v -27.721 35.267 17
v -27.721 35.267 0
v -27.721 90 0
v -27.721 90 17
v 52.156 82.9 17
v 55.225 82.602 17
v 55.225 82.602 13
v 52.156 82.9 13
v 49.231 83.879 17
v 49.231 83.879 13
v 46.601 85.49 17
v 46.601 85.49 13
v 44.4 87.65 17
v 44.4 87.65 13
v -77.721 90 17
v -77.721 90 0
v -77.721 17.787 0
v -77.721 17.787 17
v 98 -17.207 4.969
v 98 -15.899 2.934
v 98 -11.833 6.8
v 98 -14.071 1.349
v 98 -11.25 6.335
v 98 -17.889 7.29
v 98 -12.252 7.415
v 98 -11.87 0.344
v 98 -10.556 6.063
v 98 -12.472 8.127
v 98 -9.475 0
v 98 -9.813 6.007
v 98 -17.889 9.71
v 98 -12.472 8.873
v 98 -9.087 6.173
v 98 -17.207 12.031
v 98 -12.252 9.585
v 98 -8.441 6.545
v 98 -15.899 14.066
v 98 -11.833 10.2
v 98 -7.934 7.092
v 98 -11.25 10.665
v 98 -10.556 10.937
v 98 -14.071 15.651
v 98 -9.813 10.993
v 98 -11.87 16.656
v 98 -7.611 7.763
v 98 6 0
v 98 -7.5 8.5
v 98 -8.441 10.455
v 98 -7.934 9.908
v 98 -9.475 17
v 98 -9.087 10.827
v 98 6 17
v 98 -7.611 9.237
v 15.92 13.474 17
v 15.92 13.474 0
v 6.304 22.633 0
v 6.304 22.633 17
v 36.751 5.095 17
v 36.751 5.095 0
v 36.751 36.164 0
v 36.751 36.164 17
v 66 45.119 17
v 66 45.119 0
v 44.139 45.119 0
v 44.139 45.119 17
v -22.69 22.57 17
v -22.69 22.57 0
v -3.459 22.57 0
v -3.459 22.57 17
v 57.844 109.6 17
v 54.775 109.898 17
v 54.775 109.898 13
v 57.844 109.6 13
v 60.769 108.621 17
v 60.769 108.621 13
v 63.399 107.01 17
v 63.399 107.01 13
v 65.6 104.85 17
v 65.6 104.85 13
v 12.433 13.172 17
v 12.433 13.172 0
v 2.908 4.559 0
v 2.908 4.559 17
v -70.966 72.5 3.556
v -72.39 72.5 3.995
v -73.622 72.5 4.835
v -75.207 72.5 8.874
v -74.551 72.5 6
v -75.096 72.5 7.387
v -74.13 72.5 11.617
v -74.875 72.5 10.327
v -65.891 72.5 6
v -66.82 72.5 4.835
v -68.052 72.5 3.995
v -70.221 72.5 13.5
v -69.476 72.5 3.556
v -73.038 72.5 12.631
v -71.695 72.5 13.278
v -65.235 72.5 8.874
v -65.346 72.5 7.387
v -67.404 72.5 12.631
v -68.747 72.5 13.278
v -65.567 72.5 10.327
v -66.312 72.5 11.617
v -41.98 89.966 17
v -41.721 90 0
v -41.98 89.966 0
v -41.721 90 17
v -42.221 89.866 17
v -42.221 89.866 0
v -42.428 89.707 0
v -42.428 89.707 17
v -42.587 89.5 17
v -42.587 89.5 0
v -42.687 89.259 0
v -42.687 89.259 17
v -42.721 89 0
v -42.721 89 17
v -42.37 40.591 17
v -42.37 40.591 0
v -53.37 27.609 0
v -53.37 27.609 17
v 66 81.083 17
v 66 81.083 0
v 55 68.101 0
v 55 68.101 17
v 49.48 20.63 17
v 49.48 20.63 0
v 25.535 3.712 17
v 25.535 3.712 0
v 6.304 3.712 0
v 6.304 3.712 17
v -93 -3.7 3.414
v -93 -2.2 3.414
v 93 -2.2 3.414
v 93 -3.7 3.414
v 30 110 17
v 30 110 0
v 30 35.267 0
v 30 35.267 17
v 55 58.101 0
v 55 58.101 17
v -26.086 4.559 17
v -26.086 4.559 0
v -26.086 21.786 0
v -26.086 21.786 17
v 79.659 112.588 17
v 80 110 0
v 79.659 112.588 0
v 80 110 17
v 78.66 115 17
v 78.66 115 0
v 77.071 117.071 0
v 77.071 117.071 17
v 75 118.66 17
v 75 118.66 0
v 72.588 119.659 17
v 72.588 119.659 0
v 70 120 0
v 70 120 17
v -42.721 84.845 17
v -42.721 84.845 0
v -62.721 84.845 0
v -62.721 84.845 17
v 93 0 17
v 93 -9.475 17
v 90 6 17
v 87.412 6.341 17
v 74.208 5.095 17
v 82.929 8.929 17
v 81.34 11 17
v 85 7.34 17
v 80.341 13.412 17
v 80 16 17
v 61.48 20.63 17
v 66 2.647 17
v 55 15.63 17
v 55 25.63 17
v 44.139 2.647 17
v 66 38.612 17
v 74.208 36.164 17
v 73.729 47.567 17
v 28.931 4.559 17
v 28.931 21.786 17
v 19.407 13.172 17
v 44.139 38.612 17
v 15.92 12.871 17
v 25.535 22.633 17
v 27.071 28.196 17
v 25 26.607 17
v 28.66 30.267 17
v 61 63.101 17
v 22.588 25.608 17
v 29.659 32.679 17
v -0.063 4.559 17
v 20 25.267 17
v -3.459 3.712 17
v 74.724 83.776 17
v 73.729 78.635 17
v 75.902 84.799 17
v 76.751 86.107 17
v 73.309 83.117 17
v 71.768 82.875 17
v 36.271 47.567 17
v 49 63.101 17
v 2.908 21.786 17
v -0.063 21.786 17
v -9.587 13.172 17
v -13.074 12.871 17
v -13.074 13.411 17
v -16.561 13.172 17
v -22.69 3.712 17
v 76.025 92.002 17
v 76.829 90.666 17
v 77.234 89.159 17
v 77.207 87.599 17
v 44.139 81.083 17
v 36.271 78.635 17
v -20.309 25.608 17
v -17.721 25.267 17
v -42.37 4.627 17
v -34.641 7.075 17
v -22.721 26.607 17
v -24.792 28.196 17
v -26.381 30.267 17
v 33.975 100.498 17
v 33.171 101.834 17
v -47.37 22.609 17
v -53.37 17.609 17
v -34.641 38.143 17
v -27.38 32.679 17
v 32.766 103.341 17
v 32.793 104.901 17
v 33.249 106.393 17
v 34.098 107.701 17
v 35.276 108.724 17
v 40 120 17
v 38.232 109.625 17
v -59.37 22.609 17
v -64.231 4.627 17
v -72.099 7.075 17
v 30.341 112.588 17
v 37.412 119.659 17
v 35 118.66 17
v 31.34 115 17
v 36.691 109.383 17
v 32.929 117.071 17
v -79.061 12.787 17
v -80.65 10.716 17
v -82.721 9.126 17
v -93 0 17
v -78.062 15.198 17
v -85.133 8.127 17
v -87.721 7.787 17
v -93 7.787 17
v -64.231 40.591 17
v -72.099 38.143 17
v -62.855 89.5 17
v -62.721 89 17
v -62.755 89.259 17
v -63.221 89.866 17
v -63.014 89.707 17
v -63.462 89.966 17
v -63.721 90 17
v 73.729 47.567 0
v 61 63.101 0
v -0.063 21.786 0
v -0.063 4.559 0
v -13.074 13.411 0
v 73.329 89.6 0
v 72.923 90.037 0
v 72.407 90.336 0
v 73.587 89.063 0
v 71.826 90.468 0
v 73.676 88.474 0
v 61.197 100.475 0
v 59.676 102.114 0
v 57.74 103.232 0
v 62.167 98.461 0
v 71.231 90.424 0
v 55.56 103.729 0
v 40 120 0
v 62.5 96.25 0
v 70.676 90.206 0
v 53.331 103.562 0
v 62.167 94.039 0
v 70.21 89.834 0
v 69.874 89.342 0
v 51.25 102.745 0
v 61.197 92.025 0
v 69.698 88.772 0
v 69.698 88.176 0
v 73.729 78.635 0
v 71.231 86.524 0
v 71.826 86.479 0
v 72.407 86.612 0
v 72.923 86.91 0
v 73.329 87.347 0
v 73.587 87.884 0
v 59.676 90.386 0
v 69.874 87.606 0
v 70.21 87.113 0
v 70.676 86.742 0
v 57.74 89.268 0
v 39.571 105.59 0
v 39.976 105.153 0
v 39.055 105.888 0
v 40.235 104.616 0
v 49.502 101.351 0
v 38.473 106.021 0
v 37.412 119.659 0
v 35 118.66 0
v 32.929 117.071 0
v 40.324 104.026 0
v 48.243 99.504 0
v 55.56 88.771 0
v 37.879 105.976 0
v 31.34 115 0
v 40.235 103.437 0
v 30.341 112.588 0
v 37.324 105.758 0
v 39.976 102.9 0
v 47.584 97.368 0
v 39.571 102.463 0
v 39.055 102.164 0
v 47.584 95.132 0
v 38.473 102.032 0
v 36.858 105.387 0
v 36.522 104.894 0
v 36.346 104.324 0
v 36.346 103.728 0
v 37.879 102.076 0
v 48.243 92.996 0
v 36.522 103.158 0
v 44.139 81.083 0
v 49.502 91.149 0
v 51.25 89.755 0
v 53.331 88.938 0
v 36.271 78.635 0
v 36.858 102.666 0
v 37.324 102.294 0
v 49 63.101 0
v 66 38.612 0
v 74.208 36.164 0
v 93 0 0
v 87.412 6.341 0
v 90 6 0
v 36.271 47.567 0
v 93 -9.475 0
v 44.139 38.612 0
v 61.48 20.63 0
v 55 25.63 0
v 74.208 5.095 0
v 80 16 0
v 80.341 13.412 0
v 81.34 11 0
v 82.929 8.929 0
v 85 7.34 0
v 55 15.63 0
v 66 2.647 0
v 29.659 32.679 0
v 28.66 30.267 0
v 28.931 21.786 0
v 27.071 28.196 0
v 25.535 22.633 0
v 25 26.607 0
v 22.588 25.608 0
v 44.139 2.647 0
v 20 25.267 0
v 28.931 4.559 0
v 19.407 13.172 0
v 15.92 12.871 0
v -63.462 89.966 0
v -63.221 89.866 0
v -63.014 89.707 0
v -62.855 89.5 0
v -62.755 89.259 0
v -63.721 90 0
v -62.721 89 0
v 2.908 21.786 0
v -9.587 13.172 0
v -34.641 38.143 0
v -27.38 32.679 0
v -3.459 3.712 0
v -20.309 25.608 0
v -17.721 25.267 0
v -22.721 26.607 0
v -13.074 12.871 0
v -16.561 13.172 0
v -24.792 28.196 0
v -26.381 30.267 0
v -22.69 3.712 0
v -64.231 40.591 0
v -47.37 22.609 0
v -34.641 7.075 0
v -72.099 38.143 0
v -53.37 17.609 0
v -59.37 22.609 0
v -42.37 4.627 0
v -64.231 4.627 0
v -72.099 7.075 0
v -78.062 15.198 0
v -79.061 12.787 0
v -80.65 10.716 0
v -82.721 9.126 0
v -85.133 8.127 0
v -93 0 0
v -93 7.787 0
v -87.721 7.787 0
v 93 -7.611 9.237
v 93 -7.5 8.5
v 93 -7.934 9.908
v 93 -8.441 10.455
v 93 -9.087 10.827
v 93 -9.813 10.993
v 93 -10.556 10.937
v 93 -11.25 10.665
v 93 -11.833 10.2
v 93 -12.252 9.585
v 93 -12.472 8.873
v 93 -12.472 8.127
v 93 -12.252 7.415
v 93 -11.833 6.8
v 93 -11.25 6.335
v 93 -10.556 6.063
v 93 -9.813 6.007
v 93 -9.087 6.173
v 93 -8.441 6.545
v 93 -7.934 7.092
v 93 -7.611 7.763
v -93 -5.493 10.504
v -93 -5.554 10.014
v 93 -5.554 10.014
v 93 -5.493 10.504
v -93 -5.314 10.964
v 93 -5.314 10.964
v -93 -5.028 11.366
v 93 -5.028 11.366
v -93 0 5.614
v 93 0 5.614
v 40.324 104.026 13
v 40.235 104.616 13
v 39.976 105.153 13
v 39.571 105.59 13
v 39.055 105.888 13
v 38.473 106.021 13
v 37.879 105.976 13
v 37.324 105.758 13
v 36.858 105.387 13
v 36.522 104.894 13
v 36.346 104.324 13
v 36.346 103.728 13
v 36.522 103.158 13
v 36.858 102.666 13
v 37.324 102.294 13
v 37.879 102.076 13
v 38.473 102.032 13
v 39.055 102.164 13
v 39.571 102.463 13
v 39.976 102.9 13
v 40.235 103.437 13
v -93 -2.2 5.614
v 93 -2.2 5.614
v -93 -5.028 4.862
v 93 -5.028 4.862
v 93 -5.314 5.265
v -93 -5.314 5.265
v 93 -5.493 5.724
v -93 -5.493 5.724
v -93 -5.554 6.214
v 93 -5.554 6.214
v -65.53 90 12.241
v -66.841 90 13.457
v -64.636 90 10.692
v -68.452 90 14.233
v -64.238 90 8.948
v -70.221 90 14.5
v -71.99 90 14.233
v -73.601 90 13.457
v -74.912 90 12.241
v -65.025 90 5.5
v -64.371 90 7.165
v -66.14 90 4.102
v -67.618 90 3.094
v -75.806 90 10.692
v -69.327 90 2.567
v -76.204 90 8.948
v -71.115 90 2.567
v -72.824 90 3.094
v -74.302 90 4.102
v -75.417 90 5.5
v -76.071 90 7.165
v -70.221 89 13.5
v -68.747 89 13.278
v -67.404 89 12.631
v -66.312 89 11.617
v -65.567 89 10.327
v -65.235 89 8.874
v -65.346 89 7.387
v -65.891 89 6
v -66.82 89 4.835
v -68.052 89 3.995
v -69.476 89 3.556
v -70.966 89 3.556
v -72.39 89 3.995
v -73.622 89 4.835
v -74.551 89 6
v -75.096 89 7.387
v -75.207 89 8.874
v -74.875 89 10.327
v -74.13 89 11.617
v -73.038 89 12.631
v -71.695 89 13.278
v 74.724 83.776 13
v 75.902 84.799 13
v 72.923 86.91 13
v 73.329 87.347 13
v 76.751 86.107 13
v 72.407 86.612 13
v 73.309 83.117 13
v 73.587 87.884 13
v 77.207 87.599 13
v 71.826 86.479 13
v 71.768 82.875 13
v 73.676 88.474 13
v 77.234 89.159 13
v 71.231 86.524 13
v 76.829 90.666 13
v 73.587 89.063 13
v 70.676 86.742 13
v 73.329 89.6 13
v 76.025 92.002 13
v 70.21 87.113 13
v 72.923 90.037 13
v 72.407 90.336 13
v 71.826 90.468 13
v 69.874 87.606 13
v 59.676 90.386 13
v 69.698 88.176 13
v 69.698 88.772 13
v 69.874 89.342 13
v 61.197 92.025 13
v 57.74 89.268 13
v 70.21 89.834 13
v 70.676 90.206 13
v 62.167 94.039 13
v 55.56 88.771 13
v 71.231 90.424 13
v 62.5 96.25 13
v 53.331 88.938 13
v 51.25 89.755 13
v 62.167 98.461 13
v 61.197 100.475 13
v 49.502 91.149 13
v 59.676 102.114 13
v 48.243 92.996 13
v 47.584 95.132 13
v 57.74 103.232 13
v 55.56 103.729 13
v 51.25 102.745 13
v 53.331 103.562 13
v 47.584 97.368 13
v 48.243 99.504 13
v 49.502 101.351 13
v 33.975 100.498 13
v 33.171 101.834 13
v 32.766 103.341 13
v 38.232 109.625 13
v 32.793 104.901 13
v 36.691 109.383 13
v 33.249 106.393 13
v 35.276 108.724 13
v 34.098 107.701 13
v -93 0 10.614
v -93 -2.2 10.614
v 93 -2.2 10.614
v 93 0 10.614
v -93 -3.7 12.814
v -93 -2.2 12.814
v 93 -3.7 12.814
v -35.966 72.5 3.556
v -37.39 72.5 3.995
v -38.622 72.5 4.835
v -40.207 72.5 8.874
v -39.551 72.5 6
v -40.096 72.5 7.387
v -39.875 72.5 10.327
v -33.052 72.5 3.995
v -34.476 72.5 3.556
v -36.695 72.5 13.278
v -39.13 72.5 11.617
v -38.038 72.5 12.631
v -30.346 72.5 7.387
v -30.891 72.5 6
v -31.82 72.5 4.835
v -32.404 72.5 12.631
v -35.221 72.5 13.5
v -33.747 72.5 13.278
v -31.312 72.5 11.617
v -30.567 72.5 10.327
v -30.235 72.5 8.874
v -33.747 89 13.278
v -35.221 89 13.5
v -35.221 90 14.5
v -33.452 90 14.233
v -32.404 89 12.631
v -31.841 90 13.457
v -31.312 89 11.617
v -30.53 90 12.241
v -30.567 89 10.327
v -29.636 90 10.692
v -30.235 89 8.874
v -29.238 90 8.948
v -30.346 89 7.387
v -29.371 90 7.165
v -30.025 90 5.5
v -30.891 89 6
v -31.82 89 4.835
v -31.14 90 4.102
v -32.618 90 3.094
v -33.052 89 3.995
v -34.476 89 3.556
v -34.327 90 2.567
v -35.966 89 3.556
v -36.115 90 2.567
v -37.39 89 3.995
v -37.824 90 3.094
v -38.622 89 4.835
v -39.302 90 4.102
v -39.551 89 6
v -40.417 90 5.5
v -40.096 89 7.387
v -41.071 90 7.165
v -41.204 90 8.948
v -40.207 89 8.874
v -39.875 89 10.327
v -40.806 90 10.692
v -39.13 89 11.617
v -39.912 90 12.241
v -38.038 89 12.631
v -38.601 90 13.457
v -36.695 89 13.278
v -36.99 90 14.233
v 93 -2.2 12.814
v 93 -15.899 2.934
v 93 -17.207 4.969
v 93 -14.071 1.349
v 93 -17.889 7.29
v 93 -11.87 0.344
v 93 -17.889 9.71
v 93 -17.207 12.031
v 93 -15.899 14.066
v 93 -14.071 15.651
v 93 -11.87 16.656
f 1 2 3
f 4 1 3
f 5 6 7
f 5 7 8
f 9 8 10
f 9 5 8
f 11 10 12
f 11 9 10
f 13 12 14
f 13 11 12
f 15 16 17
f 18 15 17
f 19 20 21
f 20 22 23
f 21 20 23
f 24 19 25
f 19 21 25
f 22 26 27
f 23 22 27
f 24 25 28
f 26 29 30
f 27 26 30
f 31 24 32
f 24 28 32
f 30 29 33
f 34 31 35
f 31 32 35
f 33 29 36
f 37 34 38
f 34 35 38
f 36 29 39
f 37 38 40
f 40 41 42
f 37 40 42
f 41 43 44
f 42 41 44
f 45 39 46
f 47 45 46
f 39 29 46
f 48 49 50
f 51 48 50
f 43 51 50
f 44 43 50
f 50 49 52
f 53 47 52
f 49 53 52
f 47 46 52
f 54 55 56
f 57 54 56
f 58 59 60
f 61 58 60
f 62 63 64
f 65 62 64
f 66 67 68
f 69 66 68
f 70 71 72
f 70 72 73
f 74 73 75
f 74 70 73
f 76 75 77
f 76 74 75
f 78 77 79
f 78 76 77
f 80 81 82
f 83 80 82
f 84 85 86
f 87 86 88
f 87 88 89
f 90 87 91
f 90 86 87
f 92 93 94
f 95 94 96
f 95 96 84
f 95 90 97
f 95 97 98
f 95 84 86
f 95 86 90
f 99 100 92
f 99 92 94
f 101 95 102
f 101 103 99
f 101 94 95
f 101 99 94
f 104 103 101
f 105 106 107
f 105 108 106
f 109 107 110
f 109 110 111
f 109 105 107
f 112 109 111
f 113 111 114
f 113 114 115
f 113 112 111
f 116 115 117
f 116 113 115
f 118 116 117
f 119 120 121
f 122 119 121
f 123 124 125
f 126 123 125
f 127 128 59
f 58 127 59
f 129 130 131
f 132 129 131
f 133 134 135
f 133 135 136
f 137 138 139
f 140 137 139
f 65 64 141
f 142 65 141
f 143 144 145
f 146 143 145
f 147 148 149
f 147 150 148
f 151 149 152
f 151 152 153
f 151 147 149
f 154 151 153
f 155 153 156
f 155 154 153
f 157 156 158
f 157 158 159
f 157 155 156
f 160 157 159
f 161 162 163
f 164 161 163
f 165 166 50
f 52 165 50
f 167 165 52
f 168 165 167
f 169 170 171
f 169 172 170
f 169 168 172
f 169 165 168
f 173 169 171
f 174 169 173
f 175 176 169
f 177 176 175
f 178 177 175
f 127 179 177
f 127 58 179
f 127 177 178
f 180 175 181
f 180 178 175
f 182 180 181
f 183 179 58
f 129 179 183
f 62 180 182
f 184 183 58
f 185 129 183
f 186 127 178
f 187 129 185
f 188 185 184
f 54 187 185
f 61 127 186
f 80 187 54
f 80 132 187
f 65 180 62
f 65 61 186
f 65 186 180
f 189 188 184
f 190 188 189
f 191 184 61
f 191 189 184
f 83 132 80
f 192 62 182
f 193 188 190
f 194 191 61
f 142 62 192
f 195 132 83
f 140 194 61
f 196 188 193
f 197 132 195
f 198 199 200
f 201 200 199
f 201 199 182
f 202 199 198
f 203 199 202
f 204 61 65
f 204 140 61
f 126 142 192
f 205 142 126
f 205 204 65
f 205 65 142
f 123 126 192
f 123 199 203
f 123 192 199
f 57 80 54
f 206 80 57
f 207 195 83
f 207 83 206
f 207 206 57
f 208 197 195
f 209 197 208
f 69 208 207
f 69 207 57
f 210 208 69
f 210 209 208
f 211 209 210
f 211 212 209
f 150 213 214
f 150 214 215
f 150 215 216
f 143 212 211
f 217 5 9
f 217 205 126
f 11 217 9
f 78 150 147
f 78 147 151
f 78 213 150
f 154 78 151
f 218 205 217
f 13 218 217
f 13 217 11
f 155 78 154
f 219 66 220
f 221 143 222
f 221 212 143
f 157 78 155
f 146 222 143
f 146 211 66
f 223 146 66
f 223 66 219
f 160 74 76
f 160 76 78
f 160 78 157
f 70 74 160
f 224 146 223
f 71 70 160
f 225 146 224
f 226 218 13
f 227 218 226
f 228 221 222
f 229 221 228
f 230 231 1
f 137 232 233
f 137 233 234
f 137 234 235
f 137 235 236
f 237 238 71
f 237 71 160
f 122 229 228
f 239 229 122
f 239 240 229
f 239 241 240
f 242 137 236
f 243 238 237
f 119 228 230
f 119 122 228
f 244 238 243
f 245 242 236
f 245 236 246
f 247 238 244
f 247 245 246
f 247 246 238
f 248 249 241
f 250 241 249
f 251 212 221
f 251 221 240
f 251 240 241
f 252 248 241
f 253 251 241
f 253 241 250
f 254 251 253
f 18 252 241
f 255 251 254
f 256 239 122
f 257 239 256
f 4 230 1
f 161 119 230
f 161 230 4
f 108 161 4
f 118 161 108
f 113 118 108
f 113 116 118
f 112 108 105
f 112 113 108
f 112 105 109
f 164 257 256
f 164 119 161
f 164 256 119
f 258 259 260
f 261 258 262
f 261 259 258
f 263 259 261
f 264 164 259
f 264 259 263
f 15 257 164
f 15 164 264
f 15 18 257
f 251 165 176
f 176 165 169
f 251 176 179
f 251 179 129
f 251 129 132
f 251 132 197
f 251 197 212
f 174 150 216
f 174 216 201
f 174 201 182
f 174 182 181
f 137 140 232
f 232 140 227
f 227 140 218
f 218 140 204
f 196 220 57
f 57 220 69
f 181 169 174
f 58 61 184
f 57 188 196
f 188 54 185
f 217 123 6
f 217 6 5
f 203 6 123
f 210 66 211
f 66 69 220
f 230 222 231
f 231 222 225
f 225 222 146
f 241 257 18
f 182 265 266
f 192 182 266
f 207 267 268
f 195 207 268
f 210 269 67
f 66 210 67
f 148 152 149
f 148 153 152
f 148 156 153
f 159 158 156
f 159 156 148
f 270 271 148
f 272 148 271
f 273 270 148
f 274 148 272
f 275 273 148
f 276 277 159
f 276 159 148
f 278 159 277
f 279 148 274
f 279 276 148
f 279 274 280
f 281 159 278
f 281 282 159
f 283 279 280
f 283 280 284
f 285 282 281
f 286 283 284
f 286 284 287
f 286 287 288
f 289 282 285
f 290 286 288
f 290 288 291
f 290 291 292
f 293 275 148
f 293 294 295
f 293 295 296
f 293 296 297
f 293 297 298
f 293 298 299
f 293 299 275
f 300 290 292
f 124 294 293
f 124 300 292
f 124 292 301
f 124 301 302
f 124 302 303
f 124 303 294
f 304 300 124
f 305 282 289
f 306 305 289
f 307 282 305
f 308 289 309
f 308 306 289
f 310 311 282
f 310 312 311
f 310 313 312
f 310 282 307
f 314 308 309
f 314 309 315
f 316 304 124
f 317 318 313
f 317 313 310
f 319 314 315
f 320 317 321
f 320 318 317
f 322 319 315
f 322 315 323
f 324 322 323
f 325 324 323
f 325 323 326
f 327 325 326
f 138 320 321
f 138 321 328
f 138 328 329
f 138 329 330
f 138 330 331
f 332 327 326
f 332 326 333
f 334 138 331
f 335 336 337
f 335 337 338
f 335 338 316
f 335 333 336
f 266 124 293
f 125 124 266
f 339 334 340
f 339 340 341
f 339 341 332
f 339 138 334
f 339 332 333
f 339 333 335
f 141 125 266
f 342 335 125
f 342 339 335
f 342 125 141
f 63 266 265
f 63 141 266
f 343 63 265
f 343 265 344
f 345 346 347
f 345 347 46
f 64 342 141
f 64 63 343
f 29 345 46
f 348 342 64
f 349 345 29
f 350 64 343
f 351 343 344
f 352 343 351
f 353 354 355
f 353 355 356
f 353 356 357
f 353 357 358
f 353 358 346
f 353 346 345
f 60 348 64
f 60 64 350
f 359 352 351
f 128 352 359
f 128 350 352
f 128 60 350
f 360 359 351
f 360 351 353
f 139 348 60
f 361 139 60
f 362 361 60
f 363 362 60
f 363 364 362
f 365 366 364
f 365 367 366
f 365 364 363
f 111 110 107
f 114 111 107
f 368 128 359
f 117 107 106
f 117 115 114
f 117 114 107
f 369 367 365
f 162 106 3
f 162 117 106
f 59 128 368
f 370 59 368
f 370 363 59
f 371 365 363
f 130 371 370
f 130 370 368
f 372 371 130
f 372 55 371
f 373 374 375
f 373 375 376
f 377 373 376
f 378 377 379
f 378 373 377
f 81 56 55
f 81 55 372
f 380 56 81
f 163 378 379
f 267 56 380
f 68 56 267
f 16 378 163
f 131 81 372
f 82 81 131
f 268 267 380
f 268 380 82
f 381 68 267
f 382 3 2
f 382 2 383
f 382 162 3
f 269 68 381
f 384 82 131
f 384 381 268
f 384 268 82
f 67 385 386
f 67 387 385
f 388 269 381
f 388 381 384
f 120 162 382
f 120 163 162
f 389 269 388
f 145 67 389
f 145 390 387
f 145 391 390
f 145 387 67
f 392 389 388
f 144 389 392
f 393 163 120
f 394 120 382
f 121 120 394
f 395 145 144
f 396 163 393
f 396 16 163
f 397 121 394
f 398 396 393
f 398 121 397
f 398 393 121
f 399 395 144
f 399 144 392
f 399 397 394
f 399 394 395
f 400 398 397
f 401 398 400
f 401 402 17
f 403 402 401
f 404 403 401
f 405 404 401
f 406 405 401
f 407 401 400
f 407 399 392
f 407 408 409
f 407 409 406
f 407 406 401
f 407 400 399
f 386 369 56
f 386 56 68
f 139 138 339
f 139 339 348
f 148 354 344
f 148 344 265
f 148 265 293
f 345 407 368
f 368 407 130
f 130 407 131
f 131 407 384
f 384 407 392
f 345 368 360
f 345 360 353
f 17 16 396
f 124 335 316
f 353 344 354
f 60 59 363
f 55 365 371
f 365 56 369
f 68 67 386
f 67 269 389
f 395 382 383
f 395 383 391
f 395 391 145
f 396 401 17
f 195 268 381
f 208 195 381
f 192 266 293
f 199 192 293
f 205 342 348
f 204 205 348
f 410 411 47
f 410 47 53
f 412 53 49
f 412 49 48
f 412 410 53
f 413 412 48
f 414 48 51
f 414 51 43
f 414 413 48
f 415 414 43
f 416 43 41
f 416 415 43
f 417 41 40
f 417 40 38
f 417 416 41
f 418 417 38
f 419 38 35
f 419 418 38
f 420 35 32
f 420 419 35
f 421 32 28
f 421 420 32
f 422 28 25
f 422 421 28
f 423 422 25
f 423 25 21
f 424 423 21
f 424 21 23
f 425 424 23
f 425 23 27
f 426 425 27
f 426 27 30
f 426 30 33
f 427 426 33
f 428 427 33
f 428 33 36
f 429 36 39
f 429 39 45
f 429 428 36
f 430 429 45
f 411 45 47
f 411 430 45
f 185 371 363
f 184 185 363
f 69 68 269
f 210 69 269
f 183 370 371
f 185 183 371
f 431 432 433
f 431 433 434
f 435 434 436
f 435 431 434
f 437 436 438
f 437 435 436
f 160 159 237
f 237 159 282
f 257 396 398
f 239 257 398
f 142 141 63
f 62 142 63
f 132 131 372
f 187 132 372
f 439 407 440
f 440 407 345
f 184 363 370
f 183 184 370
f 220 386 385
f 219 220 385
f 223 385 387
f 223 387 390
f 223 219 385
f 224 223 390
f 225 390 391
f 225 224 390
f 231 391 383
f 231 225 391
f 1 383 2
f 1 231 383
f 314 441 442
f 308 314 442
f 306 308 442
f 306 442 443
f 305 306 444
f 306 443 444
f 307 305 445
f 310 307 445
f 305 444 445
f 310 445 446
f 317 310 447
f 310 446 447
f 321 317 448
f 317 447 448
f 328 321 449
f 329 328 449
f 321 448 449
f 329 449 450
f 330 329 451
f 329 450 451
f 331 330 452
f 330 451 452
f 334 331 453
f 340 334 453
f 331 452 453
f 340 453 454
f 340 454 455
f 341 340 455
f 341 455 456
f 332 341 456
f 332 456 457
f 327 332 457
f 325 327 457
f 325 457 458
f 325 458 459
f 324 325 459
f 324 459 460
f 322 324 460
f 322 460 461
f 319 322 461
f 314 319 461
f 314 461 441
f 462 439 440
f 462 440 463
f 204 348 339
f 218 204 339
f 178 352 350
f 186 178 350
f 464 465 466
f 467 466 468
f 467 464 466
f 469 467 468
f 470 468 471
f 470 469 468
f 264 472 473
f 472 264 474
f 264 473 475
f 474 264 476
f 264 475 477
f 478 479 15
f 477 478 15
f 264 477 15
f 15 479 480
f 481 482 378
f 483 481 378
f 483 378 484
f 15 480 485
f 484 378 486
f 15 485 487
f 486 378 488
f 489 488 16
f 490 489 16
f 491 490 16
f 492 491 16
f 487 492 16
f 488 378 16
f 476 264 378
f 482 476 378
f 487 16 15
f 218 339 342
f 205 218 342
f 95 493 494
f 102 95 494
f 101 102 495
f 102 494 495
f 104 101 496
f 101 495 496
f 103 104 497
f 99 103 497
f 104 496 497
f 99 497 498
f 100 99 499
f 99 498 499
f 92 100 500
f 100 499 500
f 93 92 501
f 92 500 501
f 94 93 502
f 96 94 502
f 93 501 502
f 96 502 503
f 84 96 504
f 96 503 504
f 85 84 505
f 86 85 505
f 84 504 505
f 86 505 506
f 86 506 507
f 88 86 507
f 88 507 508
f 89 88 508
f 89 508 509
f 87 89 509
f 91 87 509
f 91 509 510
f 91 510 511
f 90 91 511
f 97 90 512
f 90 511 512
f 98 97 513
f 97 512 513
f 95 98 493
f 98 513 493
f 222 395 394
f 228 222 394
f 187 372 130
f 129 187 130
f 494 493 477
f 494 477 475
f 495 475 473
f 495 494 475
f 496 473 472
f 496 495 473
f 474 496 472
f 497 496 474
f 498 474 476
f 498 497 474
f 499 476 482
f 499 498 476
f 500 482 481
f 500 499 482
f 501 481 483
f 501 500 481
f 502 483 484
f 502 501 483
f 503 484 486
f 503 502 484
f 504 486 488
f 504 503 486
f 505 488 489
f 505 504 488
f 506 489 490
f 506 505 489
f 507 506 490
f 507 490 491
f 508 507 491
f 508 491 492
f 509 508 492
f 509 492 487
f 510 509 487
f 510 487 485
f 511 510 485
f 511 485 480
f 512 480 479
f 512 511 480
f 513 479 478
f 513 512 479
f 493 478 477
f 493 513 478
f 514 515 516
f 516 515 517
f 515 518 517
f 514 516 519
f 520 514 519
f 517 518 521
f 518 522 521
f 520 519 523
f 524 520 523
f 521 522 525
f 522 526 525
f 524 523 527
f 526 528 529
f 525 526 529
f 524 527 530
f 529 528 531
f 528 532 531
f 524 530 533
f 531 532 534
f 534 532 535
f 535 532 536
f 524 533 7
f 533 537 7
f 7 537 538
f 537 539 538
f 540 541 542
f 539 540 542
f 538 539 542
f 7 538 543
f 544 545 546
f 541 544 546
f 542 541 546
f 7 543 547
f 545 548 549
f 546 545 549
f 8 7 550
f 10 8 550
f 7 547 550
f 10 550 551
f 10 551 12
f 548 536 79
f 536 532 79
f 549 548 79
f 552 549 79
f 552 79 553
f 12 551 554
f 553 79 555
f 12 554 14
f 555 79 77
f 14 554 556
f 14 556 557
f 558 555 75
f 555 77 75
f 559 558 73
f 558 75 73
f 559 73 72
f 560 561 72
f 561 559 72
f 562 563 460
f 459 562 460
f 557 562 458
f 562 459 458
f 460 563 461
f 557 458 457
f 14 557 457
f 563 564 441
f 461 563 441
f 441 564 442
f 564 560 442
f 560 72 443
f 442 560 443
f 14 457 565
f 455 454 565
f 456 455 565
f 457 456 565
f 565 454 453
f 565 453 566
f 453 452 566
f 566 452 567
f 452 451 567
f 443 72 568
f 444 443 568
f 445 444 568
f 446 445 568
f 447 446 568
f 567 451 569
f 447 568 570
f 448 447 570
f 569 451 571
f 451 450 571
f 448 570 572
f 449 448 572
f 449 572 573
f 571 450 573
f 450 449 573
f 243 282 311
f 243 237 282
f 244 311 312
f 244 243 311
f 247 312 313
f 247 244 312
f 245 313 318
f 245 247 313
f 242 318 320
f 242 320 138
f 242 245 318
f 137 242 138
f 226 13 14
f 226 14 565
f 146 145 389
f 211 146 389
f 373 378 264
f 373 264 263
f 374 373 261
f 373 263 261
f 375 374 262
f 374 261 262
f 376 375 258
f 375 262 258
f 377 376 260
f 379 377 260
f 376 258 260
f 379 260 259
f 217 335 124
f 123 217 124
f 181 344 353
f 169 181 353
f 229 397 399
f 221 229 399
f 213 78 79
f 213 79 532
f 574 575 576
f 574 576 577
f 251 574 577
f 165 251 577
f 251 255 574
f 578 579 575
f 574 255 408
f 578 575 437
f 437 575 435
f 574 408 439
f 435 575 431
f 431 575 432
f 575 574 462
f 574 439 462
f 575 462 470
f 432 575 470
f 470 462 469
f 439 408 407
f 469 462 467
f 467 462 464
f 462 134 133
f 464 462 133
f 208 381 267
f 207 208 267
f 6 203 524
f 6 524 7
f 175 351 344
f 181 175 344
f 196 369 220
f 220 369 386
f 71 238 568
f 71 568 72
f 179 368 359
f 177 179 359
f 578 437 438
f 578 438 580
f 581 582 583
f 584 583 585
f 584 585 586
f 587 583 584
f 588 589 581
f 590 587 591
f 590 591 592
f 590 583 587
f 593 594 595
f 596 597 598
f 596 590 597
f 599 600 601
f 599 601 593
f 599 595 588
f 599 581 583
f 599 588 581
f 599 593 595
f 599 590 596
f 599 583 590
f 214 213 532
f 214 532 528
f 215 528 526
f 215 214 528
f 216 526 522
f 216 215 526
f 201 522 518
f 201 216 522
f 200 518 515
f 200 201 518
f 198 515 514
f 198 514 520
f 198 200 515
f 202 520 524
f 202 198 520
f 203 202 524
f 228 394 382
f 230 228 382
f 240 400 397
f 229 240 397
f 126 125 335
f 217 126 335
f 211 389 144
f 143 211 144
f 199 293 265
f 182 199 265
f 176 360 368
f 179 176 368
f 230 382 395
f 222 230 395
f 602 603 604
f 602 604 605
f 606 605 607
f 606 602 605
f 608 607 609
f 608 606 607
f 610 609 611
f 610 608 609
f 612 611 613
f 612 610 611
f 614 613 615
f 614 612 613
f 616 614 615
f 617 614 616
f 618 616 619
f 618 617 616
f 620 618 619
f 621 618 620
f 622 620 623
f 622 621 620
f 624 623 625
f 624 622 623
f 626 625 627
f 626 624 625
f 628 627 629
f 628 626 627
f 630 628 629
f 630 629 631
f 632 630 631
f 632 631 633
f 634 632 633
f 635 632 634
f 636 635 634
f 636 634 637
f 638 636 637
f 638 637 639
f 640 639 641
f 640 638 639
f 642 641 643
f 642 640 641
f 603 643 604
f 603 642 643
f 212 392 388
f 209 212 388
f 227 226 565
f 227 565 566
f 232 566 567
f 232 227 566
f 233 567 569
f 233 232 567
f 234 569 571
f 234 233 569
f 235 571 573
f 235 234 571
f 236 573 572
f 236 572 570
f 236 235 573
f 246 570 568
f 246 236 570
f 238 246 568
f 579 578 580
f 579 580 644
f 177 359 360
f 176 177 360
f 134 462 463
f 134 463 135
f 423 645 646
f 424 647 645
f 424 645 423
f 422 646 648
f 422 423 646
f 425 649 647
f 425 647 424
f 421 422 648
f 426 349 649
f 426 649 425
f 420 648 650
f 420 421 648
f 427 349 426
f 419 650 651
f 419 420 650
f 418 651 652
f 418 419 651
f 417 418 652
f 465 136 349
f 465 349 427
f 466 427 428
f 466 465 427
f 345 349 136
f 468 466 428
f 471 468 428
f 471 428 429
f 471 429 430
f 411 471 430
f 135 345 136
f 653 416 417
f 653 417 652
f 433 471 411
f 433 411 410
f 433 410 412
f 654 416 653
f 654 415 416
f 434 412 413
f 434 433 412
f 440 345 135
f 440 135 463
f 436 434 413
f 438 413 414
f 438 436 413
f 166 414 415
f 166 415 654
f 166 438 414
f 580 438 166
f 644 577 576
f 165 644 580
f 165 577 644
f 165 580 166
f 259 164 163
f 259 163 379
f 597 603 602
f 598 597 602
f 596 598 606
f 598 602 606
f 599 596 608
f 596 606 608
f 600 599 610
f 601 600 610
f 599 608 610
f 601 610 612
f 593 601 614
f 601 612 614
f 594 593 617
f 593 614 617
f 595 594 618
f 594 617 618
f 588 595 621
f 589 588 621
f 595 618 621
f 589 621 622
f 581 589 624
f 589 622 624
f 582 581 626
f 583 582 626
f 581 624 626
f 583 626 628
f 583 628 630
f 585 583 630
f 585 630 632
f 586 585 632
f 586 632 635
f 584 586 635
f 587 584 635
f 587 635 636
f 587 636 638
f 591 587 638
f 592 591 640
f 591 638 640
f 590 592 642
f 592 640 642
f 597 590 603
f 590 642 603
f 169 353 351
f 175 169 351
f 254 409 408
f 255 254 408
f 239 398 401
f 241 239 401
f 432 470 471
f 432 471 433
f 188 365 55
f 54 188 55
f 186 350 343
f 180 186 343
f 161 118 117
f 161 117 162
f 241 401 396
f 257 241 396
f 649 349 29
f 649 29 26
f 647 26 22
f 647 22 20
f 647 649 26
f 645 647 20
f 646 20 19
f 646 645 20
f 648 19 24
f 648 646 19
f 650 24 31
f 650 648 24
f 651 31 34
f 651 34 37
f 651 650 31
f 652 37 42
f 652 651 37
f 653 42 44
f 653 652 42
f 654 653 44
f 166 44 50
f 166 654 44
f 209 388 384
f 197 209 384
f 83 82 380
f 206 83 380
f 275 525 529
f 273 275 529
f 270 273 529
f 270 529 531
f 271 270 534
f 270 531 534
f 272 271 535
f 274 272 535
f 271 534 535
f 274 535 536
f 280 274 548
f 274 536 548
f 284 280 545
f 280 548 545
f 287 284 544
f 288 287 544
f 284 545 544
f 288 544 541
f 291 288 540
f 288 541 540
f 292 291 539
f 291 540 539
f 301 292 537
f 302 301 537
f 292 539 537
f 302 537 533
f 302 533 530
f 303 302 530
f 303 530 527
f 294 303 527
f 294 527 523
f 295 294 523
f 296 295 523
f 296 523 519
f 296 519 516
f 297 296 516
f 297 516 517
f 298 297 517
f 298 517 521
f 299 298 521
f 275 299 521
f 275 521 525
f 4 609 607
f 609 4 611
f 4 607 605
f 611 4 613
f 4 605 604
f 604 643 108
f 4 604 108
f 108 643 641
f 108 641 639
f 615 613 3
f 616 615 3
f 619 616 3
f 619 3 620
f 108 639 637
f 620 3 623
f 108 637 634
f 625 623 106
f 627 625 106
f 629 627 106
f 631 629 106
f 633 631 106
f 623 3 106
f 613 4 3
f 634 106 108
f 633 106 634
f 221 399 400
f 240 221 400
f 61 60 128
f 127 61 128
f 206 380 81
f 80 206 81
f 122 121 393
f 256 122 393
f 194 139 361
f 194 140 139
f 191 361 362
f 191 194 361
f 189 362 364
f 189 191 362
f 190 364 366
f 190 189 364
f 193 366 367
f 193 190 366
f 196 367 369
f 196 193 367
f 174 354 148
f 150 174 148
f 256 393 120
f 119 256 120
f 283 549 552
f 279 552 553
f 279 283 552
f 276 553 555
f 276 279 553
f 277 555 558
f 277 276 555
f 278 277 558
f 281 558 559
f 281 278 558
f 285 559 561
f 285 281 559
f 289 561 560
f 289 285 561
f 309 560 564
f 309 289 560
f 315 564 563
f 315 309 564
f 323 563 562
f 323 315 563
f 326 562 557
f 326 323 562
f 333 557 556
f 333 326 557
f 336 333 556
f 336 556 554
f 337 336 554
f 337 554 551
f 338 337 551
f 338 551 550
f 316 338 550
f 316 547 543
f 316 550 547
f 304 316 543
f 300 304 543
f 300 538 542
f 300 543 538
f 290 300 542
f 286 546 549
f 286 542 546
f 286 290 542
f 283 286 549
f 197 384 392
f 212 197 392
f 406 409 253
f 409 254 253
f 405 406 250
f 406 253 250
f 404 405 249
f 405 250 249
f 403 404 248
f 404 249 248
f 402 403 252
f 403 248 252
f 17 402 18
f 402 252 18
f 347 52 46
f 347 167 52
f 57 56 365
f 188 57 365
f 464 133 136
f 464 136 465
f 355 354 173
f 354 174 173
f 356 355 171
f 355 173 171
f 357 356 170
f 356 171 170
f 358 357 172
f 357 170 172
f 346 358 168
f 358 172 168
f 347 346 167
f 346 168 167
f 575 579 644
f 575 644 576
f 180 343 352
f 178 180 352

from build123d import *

# Parameters (mm, degrees)
CROQUIS1_R              = 7.5
SALIENTE_EXTRUIR1_DEPTH = 17
REDONDEO1_R             = 10
REDONDEO2_R             = 10
REDONDEO8_R             = 10
REDONDEO9_R             = 10
REDONDEO11_R            = 10
REDONDEO12_R            = 10
SALIENTE_EXTRUIR2_DEPTH = 186
CROQUIS5_R              = 2.5
SALIENTE_EXTRUIR6_DEPTH = 5
CORTAR_EXTRUIR5_DEPTH   = 4
SKETCH3_R               = 2
CUT_EXTRUDE1_DEPTH      = 156.476686355
SKETCH4_R               = 5
CUT_EXTRUDE2_DEPTH      = 17.5
FILLET1_R               = 1
CHAMFER1_SIZE           = 1


with BuildPart() as part:
    # Croquis1 → Saliente-Extruir1 (new body)
    with BuildSketch(Plane.XY):
        Polygon((-93, 0), (93, 0), (93, 6), (80, 6), (80, 120), (30, 120), (30, 25.267194249), (-27.720969348, 25.267194249), (-27.720969348, 90), (-42.720969348, 90), (-42.720969348, 84.845258293), (-62.720969348, 84.845258293), (-62.720969348, 90), (-77.720969348, 90), (-77.720969348, 7.786589187), (-93, 7.786589187), align=None)
        Polygon((-53.370368055, 17.608830496), (-42.369998576, 4.626570416), (-64.231453048, 4.626570416), align=None, mode=Mode.SUBTRACT)
        Polygon((-72.099249791, 38.14298816), (-59.370368055, 22.608830496), (-72.099249791, 7.074672833), align=None, mode=Mode.SUBTRACT)
        Polygon((-3.458697993, 3.711831174), (-22.689998763, 3.711831174), (-13.074348378, 12.870825965), align=None, mode=Mode.SUBTRACT)
        Polygon((-26.085940215, 4.558933089), (-26.085940215, 21.785882097), (-16.561331103, 13.172407593), align=None, mode=Mode.SUBTRACT)
        Polygon((-9.587365653, 13.172407593), (-0.062756541, 21.785882097), (-0.062756541, 4.558933089), align=None, mode=Mode.SUBTRACT)
        Polygon((-34.641486319, 7.074672833), (-47.370368055, 22.608830496), (-34.641486319, 38.14298816), align=None, mode=Mode.SUBTRACT)
        Polygon((-13.074348378, 13.411373354), (-22.689998763, 22.570368145), (-3.458697993, 22.570368145), align=None, mode=Mode.SUBTRACT)
        Polygon((-53.370368055, 27.608830496), (-64.231453048, 40.591090577), (-42.369998576, 40.591090577), align=None, mode=Mode.SUBTRACT)
        Polygon((2.908210147, 4.558933089), (2.908210147, 21.785882097), (12.432819259, 13.172407593), align=None, mode=Mode.SUBTRACT)
        Polygon((6.304151599, 3.711831174), (15.919801984, 12.870825965), (25.535452369, 3.711831174), align=None, mode=Mode.SUBTRACT)
        Polygon((28.931393821, 21.785882097), (28.931393821, 4.558933089), (19.406784708, 13.172407593), align=None, mode=Mode.SUBTRACT)
        Polygon((6.304151599, 22.632984011), (25.535452369, 22.632984011), (15.919801984, 13.47398922), align=None, mode=Mode.SUBTRACT)
        Polygon((36.750632631, 36.163668304), (49.479514367, 20.629510641), (36.750632631, 5.095352977), align=None, mode=Mode.SUBTRACT)
        Polygon((55, 15.629510641), (66.000369479, 2.64725056), (44.138915007, 2.64725056), align=None, mode=Mode.SUBTRACT)
        Polygon((74.208396103, 5.095352977), (61.479514367, 20.629510641), (74.208396103, 36.163668304), align=None, mode=Mode.SUBTRACT)
        Polygon((55, 25.629510641), (44.138915007, 38.611770721), (66.000369479, 38.611770721), align=None, mode=Mode.SUBTRACT)
        Polygon((55, 58.101191757), (66.000369479, 45.118931676), (44.138915007, 45.118931676), align=None, mode=Mode.SUBTRACT)
        Polygon((36.271118264, 78.63534942), (49, 63.101191757), (36.271118264, 47.567034093), align=None, mode=Mode.SUBTRACT)
        Polygon((73.728881736, 47.567034093), (61, 63.101191757), (73.728881736, 78.63534942), align=None, mode=Mode.SUBTRACT)
        Polygon((55, 68.101191757), (44.138915007, 81.083451837), (66.000369479, 81.083451837), align=None, mode=Mode.SUBTRACT)
        with Locations((55, 96.25)):
            Circle(CROQUIS1_R, mode=Mode.SUBTRACT)
    extrude(amount=SALIENTE_EXTRUIR1_DEPTH)

    # Redondeo1
    redondeo1_edges = [part.edges().sort_by_distance(p)[0] for p in [
        (80, 120, 8.5),
    ]]
    fillet(redondeo1_edges, radius=REDONDEO1_R)

    # Redondeo2
    redondeo2_edges = [part.edges().sort_by_distance(p)[0] for p in [
        (30, 120, 8.5),
    ]]
    fillet(redondeo2_edges, radius=REDONDEO2_R)

    # Redondeo8
    redondeo8_edges = [part.edges().sort_by_distance(p)[0] for p in [
        (30, 25.267194249, 8.5),
    ]]
    fillet(redondeo8_edges, radius=REDONDEO8_R)

    # Redondeo9
    redondeo9_edges = [part.edges().sort_by_distance(p)[0] for p in [
        (-27.720969348, 25.267194249, 8.5),
    ]]
    fillet(redondeo9_edges, radius=REDONDEO9_R)

    # Redondeo11
    redondeo11_edges = [part.edges().sort_by_distance(p)[0] for p in [
        (80, 6, 8.5),
    ]]
    fillet(redondeo11_edges, radius=REDONDEO11_R)

    # Redondeo12
    redondeo12_edges = [part.edges().sort_by_distance(p)[0] for p in [
        (-77.720969348, 7.786589187, 8.5),
    ]]
    fillet(redondeo12_edges, radius=REDONDEO12_R)

    # Croquis4 → Saliente-Extruir2 (add)
    with BuildSketch(Plane.ZY.offset(93)):
        with BuildLine():
            Line((5.614135824, 0), (5.614135824, -2.2))
            Line((5.614135824, -2.2), (3.414135824, -2.2))
            Line((3.414135824, -2.2), (3.414135824, -3.7))
            Line((3.414135824, -3.7), (4.862457658, -5.028042266))
            ThreePointArc((4.862457658, -5.028042266), (5.488945101, -5.4178372), (6.214135824, -5.553943851))
            Line((6.214135824, -5.553943851), (10.014135824, -5.553943851))
            ThreePointArc((10.014135824, -5.553943851), (10.739326546, -5.4178372), (11.365813989, -5.028042266))
            Line((11.365813989, -5.028042266), (12.814135824, -3.7))
            Line((12.814135824, -3.7), (12.814135824, -2.2))
            Line((12.814135824, -2.2), (10.614135824, -2.2))
            Line((10.614135824, -2.2), (10.614135824, 0))
            Line((10.614135824, 0), (5.614135824, 0))
        make_face()
    extrude(amount=-SALIENTE_EXTRUIR2_DEPTH)

    # Croquis5 → Saliente-Extruir6 (add)
    with BuildSketch(Plane(origin=(93, 0, 0), x_dir=(0, 0, -1), z_dir=(1, 0, 0))):
        with BuildLine():
            Line((-17, 6), (0, 6))
            Line((0, 6), (0, 0))
            Line((0, 0), (0, -9.475176398))
            ThreePointArc((0, -9.475176398), (-8.5, -17.975176398), (-17, -9.475176398))
            Line((-17, -9.475176398), (-17, 0))
            Line((-17, 0), (-17, 6))
        make_face()
        with Locations((-8.5, -10)):
            Circle(CROQUIS5_R, mode=Mode.SUBTRACT)
    extrude(amount=SALIENTE_EXTRUIR6_DEPTH)

    # Croquis13 → Cortar-Extruir5 (cut)
    with BuildSketch(Plane.XY.offset(17)):
        with BuildLine():
            Line((55.225000256, 82.601854526), (71.768371079, 82.874584815))
            ThreePointArc((71.768371079, 82.874584815), (76.751386889, 86.107161718), (76.024663641, 92.00223367))
            Line((76.024663641, 92.00223367), (65.599713376, 104.850498611))
            ThreePointArc((65.599713376, 104.850498611), (60.870506535, 108.57313487), (55, 109.9))
            ThreePointArc((55, 109.9), (54.887496051, 109.899536361), (54.774999744, 109.898145474))
            Line((54.774999744, 109.898145474), (38.231628921, 109.625415185))
            ThreePointArc((38.231628921, 109.625415185), (33.248613111, 106.392838282), (33.975336359, 100.49776633))
            Line((33.975336359, 100.49776633), (44.400286624, 87.649501389))
            ThreePointArc((44.400286624, 87.649501389), (49.231260727, 83.878898707), (55.225000256, 82.601854526))
        make_face()
    extrude(amount=-CORTAR_EXTRUIR5_DEPTH, mode=Mode.SUBTRACT)

    # Sketch3 → Cut-Extrude1 (cut, through all)
    with BuildSketch(Plane.XY.offset(13)):
        with Locations((38.323936719, 104.02617602)):
            Circle(SKETCH3_R)
        with Locations((71.676063281, 88.47382398)):
            Circle(SKETCH3_R)
    extrude(amount=-CUT_EXTRUDE1_DEPTH, mode=Mode.SUBTRACT)

    # Sketch4 → Cut-Extrude2 (cut)
    with BuildSketch(Plane(origin=(0, 90, 0), x_dir=(1, 0, 0), z_dir=(0, 1, 0))):
        with Locations((-70.220969348, -8.5)):
            Circle(SKETCH4_R)
        with Locations((-35.220969348, -8.5)):
            Circle(SKETCH4_R)
    extrude(amount=-CUT_EXTRUDE2_DEPTH, mode=Mode.SUBTRACT)

    # Fillet1
    fillet1_edges = [part.edges().sort_by_distance(p)[0] for p in [
        (-42.720969348, 90, 8.5),
        (-62.720969348, 90, 8.5),
    ]]
    fillet(fillet1_edges, radius=FILLET1_R)

    # Chamfer1
    chamfer1_edges = [part.edges().sort_by_distance(p)[0] for p in [
        (-40.220969348, 90, 8.5),
        (-75.220969348, 90, 8.5),
    ]]
    chamfer(chamfer1_edges, length=CHAMFER1_SIZE)


solid = part.part
